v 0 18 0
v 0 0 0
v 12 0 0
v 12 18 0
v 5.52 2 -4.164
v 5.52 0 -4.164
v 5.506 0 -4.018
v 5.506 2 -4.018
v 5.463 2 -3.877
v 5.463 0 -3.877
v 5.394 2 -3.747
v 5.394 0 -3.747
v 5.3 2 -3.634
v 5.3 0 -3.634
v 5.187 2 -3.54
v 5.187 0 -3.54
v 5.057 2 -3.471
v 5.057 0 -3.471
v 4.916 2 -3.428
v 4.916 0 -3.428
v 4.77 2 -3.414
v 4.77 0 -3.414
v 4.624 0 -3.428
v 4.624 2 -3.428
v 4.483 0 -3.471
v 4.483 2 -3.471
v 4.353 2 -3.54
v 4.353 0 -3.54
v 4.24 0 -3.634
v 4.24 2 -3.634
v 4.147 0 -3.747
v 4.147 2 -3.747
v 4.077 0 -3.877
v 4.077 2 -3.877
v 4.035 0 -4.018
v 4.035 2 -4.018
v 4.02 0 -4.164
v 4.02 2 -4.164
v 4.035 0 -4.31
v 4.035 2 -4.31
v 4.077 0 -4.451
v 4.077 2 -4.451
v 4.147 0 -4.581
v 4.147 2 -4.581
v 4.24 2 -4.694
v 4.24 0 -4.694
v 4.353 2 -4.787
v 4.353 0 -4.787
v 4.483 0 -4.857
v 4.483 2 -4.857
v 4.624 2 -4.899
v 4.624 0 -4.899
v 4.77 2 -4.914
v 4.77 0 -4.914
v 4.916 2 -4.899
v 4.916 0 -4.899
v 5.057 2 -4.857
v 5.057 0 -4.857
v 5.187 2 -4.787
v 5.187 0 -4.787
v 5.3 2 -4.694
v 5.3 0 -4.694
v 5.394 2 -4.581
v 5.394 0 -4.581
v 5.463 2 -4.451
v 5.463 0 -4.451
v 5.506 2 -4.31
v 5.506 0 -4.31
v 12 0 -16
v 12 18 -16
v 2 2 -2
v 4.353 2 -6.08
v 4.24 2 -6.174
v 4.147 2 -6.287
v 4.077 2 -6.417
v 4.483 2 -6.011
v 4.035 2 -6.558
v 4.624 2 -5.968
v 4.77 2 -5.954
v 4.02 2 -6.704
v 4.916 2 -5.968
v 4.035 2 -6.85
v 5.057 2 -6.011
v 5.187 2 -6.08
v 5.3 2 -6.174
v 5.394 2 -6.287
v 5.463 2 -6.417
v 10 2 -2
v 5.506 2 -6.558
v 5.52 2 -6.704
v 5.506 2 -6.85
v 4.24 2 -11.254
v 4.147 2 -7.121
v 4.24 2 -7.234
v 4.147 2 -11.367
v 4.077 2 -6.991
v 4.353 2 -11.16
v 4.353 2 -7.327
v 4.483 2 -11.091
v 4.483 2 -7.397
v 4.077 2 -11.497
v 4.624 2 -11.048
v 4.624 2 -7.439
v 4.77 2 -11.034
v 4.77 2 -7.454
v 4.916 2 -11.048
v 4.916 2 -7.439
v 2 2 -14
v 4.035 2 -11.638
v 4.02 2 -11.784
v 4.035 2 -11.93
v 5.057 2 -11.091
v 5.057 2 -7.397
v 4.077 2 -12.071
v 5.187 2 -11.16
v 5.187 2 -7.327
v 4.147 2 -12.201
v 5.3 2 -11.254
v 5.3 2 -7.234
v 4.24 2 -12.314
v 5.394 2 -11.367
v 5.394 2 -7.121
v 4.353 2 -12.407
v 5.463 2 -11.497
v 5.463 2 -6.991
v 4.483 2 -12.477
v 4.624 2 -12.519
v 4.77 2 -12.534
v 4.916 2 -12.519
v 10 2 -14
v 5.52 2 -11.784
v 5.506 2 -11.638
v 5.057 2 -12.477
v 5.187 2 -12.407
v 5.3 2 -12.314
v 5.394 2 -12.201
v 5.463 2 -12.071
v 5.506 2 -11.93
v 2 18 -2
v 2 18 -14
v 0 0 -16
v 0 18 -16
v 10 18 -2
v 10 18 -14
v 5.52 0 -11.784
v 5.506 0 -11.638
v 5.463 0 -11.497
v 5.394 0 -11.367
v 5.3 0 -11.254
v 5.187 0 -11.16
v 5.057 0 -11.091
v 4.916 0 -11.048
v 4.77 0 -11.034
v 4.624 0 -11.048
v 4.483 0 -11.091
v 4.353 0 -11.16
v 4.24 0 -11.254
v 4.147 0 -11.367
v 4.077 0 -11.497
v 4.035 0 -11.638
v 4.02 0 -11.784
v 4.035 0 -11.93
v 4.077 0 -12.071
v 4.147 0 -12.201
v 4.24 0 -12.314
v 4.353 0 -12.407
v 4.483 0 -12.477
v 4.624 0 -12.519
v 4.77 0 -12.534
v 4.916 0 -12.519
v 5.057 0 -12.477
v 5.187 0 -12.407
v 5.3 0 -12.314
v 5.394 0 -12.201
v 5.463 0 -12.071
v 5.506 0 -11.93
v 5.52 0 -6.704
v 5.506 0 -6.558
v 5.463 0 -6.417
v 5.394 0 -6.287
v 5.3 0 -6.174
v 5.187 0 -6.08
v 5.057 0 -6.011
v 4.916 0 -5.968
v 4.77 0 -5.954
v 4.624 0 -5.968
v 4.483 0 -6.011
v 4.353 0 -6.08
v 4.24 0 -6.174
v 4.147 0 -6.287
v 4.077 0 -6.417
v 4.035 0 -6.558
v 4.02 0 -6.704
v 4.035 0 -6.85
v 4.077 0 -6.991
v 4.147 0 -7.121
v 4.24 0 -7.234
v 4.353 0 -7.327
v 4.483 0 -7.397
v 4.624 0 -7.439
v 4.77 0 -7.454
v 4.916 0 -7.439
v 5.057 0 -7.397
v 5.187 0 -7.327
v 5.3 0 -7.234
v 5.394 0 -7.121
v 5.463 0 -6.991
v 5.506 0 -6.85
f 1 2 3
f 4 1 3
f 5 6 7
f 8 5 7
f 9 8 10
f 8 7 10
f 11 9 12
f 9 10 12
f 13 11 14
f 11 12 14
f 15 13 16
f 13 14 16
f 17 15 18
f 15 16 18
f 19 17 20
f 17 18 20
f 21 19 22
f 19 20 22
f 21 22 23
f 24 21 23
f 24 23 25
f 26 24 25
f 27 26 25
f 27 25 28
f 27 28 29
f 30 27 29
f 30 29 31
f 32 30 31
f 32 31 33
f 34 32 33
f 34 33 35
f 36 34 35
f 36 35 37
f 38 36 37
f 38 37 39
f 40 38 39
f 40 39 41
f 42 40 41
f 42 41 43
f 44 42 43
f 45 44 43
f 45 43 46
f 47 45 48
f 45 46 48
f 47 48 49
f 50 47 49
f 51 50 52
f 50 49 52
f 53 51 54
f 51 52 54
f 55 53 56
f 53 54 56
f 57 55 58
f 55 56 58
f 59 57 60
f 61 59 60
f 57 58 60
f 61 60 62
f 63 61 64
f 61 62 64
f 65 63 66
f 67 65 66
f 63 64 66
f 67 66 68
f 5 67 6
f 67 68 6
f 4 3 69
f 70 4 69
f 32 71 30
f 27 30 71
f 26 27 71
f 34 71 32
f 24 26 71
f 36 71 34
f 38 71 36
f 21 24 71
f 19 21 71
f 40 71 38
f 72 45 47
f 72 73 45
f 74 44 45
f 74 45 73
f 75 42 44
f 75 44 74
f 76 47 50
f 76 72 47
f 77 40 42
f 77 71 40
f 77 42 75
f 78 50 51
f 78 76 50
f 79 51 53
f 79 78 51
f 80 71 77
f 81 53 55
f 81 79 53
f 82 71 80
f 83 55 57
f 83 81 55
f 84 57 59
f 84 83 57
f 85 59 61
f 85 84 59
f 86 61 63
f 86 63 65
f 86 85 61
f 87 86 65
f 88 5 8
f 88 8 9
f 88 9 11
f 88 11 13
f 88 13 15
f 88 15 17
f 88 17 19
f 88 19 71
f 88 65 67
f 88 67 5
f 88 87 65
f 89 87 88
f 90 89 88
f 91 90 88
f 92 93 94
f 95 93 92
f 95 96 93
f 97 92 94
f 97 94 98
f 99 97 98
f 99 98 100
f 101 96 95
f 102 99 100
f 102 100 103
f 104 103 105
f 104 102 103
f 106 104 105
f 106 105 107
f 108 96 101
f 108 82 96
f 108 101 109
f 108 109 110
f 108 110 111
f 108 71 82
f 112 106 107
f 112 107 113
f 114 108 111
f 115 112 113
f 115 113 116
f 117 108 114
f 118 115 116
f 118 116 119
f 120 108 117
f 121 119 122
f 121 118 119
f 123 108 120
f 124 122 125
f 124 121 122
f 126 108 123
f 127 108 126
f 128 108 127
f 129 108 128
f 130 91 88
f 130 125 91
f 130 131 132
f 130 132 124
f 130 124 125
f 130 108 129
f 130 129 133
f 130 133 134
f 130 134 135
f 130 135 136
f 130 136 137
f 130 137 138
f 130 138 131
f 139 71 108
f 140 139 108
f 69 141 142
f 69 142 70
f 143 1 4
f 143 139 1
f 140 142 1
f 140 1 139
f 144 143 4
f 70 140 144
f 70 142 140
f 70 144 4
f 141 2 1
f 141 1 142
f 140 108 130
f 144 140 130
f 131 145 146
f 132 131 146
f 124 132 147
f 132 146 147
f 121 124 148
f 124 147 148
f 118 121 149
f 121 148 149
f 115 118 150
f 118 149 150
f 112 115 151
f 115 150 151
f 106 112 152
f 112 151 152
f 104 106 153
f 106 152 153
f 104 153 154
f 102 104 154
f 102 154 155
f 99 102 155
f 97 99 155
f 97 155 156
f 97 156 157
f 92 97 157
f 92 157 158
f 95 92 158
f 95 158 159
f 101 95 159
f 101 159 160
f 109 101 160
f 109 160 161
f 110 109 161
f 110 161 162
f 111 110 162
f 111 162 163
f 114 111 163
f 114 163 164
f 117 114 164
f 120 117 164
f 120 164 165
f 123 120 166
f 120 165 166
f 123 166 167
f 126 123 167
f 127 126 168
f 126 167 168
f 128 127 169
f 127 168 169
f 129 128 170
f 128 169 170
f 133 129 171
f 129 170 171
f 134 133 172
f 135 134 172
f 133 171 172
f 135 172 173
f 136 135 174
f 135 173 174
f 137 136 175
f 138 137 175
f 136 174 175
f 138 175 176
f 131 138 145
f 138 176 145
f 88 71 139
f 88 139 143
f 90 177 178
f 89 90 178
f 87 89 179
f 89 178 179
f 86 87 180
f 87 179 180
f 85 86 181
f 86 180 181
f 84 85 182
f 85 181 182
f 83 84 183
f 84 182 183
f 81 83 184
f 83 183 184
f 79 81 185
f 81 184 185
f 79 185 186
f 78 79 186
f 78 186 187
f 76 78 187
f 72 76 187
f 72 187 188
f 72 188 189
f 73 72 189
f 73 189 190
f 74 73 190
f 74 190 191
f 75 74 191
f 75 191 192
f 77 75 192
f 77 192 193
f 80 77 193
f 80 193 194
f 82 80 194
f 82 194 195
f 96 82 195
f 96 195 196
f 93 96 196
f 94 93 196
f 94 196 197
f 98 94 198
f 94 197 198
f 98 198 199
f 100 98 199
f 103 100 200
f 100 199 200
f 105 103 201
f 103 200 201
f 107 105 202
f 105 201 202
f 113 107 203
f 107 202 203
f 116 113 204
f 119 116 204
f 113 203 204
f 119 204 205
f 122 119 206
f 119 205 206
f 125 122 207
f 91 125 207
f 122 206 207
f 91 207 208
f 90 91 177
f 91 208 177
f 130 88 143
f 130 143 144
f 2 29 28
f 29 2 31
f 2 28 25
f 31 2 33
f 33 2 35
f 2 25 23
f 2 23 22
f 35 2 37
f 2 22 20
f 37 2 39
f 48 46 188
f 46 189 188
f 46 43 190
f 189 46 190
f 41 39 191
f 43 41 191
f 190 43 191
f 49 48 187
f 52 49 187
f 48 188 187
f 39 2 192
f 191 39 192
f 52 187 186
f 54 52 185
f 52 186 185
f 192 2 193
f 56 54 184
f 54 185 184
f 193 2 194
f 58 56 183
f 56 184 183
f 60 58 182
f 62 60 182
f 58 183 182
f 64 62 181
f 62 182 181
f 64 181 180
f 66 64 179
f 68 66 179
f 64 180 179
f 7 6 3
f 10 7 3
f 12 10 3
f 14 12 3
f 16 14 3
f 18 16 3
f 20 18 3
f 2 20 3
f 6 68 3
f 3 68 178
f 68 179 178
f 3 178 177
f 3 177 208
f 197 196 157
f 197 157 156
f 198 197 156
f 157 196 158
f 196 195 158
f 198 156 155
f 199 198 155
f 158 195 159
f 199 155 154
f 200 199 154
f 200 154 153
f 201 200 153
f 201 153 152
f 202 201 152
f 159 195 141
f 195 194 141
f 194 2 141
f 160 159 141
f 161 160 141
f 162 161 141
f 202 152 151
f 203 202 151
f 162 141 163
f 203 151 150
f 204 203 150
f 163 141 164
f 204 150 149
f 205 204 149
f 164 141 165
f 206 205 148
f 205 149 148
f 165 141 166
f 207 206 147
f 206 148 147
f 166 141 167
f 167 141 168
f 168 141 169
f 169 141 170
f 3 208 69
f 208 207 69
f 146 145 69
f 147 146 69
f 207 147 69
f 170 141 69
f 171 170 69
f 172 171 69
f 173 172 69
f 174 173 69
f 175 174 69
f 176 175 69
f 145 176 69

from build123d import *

# Parameters (mm, degrees)
SKETCH1_W           = 12
SKETCH1_H           = 16
BOSS_EXTRUDE1_DEPTH = 18
SHELL1_T            = -2
SKETCH2_R           = 0.75
CUT_EXTRUDE1_DEPTH  = 10


with BuildPart() as part:
    # Sketch1 → Boss-Extrude1 (new body)
    with BuildSketch(Plane(origin=(0, 0, 0), x_dir=(1, 0, 0), z_dir=(0, 1, 0))):
        with Locations((6, 8)):
            Rectangle(SKETCH1_W, SKETCH1_H)
    extrude(amount=BOSS_EXTRUDE1_DEPTH)

    # Shell1
    shell1_openings = [part.faces().sort_by_distance(p)[0] for p in [
        (6, 18, -8),
    ]]
    offset(amount=SHELL1_T, openings=shell1_openings, kind=Kind.INTERSECTION)

    # Sketch2 → Cut-Extrude1 (cut)
    with BuildSketch(Plane.XZ):
        with Locations((4.770114722, -4.163836206)):
            Circle(SKETCH2_R)
        with Locations((4.770114722, -6.703836206)):
            Circle(SKETCH2_R)
        with Locations((4.770114721, -11.783836206)):
            Circle(SKETCH2_R)
    extrude(amount=-CUT_EXTRUDE1_DEPTH, mode=Mode.SUBTRACT)


solid = part.part
